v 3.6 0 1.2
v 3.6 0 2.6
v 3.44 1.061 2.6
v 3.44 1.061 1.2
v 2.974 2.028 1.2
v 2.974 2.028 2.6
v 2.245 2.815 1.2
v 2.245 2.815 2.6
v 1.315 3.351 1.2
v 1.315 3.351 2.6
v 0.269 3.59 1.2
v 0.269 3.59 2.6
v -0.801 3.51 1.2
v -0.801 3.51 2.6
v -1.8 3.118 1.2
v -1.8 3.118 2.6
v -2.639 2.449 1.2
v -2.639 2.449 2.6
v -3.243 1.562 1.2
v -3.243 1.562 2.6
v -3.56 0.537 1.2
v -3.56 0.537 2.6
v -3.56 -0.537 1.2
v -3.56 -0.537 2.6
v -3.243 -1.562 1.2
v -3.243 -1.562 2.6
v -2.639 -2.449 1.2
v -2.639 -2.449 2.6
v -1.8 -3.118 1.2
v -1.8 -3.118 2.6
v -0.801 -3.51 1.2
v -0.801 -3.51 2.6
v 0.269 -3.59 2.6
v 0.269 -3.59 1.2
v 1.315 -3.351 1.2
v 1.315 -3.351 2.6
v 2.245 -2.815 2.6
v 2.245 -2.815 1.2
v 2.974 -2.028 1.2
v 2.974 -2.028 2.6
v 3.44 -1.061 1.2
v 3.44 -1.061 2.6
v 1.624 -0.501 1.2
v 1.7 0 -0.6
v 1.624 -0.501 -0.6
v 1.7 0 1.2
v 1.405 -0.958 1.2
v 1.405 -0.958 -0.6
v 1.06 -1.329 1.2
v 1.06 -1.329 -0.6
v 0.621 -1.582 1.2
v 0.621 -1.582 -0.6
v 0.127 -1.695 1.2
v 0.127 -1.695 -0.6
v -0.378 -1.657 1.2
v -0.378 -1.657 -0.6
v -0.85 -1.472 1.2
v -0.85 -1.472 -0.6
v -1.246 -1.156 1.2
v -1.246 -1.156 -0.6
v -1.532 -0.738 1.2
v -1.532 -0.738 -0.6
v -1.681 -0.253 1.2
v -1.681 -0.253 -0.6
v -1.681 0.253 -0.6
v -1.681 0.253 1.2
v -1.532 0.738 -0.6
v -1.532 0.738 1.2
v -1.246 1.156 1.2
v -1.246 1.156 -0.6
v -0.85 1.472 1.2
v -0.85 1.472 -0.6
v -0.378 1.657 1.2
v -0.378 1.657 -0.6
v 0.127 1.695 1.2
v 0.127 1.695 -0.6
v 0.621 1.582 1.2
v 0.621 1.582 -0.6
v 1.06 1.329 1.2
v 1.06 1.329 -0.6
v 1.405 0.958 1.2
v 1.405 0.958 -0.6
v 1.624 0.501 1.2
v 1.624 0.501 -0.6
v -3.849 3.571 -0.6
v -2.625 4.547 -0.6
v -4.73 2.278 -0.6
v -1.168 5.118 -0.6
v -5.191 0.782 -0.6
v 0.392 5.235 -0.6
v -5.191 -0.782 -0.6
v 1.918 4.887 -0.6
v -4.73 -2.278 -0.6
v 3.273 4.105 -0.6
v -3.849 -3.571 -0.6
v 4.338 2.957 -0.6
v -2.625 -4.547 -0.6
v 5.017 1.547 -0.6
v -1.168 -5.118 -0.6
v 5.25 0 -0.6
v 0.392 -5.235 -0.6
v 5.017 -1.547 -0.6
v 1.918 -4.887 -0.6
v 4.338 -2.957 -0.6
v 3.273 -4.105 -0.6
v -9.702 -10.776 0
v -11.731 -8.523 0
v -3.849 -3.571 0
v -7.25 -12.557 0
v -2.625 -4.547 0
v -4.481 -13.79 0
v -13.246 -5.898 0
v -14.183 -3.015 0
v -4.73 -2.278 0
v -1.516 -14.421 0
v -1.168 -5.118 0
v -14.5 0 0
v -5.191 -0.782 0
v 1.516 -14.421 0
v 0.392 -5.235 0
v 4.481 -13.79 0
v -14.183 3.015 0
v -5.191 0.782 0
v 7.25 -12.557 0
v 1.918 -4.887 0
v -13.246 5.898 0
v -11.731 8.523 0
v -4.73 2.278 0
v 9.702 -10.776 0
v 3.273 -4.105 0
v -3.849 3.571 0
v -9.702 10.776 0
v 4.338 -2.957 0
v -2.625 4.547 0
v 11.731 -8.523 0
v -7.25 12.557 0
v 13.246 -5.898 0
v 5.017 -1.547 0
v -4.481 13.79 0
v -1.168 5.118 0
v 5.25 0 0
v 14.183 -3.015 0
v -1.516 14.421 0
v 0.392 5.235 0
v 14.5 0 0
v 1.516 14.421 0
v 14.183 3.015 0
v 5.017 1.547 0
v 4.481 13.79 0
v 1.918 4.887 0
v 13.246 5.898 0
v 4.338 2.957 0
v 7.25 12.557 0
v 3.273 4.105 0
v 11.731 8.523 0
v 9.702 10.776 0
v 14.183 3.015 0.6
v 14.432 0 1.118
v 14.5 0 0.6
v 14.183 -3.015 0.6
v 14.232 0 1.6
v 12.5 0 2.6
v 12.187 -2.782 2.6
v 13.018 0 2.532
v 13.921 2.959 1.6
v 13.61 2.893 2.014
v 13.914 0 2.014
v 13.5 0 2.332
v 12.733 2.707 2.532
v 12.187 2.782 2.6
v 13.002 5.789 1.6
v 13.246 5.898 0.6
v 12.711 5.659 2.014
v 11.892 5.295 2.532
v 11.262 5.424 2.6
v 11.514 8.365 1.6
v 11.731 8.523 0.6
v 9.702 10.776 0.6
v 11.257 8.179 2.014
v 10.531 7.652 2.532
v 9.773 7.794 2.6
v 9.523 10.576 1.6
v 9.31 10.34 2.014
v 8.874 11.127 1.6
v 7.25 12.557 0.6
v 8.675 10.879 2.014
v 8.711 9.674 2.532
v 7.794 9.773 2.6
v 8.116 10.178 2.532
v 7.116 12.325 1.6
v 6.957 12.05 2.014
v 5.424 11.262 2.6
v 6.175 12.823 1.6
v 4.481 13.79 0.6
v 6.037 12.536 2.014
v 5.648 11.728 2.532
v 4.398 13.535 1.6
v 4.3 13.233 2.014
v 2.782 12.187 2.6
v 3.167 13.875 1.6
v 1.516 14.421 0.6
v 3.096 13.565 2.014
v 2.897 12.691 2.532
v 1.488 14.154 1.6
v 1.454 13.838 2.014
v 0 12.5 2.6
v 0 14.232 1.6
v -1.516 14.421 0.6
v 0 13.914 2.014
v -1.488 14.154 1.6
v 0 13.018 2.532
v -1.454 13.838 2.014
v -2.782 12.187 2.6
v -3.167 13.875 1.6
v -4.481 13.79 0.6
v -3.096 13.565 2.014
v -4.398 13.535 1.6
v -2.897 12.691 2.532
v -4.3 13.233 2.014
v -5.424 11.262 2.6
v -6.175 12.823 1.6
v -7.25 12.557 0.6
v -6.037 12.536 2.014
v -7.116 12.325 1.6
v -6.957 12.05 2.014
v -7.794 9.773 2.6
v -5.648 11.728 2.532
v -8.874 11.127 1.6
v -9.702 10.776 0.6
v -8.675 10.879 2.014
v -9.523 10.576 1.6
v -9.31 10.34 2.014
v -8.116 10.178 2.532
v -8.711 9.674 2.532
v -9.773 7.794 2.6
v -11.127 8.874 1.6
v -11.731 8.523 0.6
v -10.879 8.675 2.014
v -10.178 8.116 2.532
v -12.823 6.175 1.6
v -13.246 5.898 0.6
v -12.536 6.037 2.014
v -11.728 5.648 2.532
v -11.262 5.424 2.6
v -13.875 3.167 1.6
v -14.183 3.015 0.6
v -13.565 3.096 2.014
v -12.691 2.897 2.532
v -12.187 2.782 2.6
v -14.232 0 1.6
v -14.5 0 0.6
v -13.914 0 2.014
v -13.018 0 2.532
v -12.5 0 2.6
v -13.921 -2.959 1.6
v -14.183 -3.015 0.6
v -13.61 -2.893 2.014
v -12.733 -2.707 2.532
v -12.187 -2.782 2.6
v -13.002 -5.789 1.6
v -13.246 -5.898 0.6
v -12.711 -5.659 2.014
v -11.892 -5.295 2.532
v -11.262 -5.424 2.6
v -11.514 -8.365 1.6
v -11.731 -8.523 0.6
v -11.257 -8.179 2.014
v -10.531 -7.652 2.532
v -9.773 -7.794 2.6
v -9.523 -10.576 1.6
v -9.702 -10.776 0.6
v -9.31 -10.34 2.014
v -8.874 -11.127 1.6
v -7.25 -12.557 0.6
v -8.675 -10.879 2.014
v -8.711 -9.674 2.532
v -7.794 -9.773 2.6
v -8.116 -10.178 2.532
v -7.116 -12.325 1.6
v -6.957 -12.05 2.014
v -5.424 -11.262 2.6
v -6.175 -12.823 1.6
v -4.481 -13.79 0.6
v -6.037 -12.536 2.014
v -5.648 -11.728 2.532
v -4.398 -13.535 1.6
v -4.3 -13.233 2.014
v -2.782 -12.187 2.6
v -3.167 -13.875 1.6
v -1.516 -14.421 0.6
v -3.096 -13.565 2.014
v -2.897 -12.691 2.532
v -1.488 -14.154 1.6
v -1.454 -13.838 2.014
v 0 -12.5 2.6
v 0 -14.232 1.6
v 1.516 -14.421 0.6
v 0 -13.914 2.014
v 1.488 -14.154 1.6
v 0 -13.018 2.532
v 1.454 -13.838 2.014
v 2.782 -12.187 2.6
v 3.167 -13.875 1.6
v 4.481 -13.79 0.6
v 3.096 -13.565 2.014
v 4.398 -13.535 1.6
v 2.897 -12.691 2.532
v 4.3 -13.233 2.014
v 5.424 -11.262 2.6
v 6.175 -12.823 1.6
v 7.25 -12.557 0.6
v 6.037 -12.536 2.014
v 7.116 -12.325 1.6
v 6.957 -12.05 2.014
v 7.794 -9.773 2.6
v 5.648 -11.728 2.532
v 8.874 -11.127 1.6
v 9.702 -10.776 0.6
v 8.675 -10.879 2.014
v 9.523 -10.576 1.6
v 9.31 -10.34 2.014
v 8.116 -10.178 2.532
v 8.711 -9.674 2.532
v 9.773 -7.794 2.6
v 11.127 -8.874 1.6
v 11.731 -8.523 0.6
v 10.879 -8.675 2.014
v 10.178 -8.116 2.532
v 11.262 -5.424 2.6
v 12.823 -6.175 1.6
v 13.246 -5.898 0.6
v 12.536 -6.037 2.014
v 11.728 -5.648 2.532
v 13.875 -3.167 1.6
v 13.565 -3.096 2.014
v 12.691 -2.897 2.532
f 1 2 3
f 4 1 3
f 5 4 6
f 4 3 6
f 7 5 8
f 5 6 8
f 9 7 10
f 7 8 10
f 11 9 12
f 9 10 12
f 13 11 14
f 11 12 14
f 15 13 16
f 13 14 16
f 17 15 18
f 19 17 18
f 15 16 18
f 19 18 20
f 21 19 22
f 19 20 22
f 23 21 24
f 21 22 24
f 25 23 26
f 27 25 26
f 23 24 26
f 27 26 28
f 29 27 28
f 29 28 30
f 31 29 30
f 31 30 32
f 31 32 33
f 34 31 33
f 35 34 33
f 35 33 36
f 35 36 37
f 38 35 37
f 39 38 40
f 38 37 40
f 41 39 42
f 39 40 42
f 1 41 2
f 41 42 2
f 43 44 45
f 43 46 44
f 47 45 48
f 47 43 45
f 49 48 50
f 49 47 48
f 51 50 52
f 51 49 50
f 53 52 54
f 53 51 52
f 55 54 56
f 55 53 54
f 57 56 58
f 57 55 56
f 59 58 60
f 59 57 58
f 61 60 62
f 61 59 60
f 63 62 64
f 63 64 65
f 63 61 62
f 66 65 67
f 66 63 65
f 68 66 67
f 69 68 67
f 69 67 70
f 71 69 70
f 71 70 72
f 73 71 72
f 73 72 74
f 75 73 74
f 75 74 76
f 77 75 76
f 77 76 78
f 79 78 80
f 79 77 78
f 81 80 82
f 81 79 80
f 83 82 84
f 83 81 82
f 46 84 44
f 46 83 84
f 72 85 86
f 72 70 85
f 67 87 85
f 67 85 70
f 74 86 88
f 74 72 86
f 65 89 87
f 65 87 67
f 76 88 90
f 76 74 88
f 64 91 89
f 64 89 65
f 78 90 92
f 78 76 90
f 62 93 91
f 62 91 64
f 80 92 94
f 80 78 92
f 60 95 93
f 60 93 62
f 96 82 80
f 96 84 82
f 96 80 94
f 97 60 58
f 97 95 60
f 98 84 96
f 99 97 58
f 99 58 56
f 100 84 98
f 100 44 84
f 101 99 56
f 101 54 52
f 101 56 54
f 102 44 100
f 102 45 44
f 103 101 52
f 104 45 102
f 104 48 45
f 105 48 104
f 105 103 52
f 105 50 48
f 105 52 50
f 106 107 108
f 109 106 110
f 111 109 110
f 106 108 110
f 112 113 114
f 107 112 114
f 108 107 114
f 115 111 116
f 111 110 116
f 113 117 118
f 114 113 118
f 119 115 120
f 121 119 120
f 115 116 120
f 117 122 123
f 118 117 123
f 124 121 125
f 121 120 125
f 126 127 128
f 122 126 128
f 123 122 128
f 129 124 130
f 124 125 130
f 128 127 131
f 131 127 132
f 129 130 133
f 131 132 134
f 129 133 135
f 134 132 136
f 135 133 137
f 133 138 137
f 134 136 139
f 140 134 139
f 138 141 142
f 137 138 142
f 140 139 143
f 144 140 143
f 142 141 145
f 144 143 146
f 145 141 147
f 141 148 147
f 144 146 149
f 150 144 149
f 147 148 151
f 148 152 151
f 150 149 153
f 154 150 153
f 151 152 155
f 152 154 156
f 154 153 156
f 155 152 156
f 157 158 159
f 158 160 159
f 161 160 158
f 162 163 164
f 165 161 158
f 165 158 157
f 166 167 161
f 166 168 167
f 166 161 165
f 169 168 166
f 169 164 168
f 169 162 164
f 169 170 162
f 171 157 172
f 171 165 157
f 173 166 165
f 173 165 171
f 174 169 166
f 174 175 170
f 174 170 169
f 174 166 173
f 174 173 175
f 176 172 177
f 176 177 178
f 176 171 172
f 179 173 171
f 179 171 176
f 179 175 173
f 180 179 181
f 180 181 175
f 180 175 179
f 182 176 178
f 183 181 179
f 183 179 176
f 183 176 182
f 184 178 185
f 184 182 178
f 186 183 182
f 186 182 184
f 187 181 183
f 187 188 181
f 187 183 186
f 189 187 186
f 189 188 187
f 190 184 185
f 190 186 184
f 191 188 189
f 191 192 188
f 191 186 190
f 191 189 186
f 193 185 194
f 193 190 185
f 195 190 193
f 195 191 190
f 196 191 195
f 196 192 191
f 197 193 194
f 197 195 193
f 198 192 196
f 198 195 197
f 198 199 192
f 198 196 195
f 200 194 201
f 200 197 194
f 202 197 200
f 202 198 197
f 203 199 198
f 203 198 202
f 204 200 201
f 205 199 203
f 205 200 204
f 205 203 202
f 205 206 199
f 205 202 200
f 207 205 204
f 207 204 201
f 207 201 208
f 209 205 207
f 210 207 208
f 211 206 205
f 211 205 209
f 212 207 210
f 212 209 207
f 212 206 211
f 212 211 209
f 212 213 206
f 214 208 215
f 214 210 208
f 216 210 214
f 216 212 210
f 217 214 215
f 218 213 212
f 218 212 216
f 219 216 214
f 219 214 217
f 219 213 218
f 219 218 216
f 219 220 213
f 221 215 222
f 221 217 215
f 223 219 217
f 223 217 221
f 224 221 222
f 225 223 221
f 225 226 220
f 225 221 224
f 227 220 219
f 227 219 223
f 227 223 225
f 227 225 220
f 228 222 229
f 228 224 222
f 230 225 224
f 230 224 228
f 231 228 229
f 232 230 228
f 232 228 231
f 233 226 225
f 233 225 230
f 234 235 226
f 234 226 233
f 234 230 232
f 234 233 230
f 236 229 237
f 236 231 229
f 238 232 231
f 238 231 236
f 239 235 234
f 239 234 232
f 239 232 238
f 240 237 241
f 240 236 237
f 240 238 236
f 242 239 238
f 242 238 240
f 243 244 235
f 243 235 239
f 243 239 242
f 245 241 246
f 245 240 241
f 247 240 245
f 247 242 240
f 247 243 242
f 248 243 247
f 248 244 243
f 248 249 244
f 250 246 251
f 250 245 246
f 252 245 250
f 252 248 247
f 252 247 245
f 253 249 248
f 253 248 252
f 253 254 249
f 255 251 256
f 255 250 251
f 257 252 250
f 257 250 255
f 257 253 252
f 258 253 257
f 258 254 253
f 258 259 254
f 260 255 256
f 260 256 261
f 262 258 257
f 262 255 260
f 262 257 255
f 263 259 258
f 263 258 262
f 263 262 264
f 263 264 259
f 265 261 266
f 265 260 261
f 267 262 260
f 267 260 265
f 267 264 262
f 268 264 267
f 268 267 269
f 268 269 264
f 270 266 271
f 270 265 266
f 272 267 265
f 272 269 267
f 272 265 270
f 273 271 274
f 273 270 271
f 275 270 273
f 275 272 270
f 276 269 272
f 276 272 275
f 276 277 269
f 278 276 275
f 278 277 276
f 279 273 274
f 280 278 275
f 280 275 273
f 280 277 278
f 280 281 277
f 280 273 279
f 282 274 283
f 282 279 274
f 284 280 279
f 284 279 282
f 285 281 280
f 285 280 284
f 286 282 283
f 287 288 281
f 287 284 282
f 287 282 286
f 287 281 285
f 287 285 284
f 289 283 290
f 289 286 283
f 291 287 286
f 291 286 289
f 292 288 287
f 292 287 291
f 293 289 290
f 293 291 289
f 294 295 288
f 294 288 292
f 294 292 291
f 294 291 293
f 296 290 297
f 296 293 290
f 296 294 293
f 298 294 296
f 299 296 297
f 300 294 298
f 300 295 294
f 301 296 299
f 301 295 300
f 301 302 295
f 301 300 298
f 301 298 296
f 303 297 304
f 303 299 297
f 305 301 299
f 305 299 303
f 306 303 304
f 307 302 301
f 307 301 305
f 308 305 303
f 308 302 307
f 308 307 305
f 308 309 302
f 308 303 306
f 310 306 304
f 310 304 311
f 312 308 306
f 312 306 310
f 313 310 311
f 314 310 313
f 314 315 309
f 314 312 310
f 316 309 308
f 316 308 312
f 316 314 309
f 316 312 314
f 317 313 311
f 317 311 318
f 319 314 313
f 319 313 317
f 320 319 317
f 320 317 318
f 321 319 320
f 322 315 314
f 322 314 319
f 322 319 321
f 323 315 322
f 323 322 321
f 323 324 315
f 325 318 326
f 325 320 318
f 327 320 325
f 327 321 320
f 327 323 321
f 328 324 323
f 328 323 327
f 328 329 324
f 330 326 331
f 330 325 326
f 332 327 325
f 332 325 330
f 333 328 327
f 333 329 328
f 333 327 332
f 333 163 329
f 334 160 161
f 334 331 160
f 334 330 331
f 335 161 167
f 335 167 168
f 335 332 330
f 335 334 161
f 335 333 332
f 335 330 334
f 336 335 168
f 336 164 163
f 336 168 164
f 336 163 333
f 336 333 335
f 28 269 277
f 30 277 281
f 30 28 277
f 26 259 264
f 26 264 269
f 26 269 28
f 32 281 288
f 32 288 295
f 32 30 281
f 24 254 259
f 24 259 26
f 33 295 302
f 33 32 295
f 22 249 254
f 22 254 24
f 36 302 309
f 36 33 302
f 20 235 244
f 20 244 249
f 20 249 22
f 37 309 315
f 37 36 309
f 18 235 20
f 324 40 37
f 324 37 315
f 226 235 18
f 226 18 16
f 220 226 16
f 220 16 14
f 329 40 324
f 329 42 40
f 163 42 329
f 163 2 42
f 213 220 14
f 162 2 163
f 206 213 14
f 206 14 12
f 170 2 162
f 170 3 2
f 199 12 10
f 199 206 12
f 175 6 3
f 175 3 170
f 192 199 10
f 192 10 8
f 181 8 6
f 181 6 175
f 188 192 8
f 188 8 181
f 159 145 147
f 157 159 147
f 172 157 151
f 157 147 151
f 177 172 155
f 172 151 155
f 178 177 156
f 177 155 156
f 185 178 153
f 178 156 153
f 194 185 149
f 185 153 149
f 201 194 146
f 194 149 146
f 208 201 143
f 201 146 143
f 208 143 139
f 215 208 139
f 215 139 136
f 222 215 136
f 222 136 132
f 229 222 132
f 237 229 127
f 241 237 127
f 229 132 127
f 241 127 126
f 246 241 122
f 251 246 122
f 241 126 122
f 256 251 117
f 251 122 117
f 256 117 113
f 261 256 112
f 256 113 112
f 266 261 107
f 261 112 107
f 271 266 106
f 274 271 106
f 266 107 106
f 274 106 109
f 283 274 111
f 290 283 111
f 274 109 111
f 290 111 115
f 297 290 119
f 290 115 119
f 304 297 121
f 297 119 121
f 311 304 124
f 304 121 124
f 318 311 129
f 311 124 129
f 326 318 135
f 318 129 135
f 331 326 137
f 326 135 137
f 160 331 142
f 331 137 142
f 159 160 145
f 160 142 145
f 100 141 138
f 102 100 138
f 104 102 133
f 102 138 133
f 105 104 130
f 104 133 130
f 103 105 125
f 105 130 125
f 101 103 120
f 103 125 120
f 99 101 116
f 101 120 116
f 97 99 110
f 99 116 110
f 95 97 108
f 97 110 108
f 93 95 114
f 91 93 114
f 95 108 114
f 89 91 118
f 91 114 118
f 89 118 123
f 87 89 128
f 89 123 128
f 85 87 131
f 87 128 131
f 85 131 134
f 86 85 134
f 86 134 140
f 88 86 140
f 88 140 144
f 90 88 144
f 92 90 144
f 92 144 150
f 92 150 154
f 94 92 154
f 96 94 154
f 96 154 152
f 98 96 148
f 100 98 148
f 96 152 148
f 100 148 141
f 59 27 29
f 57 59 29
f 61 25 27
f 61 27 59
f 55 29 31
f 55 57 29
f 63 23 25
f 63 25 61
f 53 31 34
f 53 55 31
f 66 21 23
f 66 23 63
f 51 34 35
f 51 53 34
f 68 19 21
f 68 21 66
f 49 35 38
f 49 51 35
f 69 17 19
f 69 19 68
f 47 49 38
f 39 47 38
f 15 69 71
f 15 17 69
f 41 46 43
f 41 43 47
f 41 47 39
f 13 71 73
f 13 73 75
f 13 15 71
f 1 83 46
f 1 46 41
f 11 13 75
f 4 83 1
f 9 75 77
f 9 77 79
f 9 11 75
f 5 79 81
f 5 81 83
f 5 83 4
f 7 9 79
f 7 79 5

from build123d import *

# Parameters (mm, degrees)
SKETCH005_R     = 14.5
SKETCH005_R_2   = 1.7
PAD004_DEPTH    = 2.6
SKETCH006_R     = 3.6
POCKET001_DEPTH = 1.4
FILLET_R        = 2
SKETCH010_R     = 5.25
SKETCH010_R_2   = 1.7
PAD007_DEPTH    = 0.6


with BuildPart() as part:
    # Sketch005 → Pad004 (new body)
    with BuildSketch(Plane.XY):
        Circle(SKETCH005_R)
        Circle(SKETCH005_R_2, mode=Mode.SUBTRACT)
    extrude(amount=PAD004_DEPTH)

    # Sketch006 (on Face4 of Pad004) → Pocket001 (cut)
    with BuildSketch(Plane.XY.offset(2.6)):
        Circle(SKETCH006_R)
    extrude(amount=-POCKET001_DEPTH, mode=Mode.SUBTRACT)

    # Fillet
    fillet_edges = [part.edges().sort_by_distance(p)[0] for p in [
        (-14.5, 0, 2.6),
    ]]
    fillet(fillet_edges, radius=FILLET_R)

    # Sketch010 (on Face3 of Fillet) → Pad007 (join)
    with BuildSketch(Plane(origin=(0, 0, 0), x_dir=(1, 0, 0), z_dir=(0, 0, -1))):
        Circle(SKETCH010_R)
        Circle(SKETCH010_R_2, mode=Mode.SUBTRACT)
    extrude(amount=PAD007_DEPTH)


solid = part.part
